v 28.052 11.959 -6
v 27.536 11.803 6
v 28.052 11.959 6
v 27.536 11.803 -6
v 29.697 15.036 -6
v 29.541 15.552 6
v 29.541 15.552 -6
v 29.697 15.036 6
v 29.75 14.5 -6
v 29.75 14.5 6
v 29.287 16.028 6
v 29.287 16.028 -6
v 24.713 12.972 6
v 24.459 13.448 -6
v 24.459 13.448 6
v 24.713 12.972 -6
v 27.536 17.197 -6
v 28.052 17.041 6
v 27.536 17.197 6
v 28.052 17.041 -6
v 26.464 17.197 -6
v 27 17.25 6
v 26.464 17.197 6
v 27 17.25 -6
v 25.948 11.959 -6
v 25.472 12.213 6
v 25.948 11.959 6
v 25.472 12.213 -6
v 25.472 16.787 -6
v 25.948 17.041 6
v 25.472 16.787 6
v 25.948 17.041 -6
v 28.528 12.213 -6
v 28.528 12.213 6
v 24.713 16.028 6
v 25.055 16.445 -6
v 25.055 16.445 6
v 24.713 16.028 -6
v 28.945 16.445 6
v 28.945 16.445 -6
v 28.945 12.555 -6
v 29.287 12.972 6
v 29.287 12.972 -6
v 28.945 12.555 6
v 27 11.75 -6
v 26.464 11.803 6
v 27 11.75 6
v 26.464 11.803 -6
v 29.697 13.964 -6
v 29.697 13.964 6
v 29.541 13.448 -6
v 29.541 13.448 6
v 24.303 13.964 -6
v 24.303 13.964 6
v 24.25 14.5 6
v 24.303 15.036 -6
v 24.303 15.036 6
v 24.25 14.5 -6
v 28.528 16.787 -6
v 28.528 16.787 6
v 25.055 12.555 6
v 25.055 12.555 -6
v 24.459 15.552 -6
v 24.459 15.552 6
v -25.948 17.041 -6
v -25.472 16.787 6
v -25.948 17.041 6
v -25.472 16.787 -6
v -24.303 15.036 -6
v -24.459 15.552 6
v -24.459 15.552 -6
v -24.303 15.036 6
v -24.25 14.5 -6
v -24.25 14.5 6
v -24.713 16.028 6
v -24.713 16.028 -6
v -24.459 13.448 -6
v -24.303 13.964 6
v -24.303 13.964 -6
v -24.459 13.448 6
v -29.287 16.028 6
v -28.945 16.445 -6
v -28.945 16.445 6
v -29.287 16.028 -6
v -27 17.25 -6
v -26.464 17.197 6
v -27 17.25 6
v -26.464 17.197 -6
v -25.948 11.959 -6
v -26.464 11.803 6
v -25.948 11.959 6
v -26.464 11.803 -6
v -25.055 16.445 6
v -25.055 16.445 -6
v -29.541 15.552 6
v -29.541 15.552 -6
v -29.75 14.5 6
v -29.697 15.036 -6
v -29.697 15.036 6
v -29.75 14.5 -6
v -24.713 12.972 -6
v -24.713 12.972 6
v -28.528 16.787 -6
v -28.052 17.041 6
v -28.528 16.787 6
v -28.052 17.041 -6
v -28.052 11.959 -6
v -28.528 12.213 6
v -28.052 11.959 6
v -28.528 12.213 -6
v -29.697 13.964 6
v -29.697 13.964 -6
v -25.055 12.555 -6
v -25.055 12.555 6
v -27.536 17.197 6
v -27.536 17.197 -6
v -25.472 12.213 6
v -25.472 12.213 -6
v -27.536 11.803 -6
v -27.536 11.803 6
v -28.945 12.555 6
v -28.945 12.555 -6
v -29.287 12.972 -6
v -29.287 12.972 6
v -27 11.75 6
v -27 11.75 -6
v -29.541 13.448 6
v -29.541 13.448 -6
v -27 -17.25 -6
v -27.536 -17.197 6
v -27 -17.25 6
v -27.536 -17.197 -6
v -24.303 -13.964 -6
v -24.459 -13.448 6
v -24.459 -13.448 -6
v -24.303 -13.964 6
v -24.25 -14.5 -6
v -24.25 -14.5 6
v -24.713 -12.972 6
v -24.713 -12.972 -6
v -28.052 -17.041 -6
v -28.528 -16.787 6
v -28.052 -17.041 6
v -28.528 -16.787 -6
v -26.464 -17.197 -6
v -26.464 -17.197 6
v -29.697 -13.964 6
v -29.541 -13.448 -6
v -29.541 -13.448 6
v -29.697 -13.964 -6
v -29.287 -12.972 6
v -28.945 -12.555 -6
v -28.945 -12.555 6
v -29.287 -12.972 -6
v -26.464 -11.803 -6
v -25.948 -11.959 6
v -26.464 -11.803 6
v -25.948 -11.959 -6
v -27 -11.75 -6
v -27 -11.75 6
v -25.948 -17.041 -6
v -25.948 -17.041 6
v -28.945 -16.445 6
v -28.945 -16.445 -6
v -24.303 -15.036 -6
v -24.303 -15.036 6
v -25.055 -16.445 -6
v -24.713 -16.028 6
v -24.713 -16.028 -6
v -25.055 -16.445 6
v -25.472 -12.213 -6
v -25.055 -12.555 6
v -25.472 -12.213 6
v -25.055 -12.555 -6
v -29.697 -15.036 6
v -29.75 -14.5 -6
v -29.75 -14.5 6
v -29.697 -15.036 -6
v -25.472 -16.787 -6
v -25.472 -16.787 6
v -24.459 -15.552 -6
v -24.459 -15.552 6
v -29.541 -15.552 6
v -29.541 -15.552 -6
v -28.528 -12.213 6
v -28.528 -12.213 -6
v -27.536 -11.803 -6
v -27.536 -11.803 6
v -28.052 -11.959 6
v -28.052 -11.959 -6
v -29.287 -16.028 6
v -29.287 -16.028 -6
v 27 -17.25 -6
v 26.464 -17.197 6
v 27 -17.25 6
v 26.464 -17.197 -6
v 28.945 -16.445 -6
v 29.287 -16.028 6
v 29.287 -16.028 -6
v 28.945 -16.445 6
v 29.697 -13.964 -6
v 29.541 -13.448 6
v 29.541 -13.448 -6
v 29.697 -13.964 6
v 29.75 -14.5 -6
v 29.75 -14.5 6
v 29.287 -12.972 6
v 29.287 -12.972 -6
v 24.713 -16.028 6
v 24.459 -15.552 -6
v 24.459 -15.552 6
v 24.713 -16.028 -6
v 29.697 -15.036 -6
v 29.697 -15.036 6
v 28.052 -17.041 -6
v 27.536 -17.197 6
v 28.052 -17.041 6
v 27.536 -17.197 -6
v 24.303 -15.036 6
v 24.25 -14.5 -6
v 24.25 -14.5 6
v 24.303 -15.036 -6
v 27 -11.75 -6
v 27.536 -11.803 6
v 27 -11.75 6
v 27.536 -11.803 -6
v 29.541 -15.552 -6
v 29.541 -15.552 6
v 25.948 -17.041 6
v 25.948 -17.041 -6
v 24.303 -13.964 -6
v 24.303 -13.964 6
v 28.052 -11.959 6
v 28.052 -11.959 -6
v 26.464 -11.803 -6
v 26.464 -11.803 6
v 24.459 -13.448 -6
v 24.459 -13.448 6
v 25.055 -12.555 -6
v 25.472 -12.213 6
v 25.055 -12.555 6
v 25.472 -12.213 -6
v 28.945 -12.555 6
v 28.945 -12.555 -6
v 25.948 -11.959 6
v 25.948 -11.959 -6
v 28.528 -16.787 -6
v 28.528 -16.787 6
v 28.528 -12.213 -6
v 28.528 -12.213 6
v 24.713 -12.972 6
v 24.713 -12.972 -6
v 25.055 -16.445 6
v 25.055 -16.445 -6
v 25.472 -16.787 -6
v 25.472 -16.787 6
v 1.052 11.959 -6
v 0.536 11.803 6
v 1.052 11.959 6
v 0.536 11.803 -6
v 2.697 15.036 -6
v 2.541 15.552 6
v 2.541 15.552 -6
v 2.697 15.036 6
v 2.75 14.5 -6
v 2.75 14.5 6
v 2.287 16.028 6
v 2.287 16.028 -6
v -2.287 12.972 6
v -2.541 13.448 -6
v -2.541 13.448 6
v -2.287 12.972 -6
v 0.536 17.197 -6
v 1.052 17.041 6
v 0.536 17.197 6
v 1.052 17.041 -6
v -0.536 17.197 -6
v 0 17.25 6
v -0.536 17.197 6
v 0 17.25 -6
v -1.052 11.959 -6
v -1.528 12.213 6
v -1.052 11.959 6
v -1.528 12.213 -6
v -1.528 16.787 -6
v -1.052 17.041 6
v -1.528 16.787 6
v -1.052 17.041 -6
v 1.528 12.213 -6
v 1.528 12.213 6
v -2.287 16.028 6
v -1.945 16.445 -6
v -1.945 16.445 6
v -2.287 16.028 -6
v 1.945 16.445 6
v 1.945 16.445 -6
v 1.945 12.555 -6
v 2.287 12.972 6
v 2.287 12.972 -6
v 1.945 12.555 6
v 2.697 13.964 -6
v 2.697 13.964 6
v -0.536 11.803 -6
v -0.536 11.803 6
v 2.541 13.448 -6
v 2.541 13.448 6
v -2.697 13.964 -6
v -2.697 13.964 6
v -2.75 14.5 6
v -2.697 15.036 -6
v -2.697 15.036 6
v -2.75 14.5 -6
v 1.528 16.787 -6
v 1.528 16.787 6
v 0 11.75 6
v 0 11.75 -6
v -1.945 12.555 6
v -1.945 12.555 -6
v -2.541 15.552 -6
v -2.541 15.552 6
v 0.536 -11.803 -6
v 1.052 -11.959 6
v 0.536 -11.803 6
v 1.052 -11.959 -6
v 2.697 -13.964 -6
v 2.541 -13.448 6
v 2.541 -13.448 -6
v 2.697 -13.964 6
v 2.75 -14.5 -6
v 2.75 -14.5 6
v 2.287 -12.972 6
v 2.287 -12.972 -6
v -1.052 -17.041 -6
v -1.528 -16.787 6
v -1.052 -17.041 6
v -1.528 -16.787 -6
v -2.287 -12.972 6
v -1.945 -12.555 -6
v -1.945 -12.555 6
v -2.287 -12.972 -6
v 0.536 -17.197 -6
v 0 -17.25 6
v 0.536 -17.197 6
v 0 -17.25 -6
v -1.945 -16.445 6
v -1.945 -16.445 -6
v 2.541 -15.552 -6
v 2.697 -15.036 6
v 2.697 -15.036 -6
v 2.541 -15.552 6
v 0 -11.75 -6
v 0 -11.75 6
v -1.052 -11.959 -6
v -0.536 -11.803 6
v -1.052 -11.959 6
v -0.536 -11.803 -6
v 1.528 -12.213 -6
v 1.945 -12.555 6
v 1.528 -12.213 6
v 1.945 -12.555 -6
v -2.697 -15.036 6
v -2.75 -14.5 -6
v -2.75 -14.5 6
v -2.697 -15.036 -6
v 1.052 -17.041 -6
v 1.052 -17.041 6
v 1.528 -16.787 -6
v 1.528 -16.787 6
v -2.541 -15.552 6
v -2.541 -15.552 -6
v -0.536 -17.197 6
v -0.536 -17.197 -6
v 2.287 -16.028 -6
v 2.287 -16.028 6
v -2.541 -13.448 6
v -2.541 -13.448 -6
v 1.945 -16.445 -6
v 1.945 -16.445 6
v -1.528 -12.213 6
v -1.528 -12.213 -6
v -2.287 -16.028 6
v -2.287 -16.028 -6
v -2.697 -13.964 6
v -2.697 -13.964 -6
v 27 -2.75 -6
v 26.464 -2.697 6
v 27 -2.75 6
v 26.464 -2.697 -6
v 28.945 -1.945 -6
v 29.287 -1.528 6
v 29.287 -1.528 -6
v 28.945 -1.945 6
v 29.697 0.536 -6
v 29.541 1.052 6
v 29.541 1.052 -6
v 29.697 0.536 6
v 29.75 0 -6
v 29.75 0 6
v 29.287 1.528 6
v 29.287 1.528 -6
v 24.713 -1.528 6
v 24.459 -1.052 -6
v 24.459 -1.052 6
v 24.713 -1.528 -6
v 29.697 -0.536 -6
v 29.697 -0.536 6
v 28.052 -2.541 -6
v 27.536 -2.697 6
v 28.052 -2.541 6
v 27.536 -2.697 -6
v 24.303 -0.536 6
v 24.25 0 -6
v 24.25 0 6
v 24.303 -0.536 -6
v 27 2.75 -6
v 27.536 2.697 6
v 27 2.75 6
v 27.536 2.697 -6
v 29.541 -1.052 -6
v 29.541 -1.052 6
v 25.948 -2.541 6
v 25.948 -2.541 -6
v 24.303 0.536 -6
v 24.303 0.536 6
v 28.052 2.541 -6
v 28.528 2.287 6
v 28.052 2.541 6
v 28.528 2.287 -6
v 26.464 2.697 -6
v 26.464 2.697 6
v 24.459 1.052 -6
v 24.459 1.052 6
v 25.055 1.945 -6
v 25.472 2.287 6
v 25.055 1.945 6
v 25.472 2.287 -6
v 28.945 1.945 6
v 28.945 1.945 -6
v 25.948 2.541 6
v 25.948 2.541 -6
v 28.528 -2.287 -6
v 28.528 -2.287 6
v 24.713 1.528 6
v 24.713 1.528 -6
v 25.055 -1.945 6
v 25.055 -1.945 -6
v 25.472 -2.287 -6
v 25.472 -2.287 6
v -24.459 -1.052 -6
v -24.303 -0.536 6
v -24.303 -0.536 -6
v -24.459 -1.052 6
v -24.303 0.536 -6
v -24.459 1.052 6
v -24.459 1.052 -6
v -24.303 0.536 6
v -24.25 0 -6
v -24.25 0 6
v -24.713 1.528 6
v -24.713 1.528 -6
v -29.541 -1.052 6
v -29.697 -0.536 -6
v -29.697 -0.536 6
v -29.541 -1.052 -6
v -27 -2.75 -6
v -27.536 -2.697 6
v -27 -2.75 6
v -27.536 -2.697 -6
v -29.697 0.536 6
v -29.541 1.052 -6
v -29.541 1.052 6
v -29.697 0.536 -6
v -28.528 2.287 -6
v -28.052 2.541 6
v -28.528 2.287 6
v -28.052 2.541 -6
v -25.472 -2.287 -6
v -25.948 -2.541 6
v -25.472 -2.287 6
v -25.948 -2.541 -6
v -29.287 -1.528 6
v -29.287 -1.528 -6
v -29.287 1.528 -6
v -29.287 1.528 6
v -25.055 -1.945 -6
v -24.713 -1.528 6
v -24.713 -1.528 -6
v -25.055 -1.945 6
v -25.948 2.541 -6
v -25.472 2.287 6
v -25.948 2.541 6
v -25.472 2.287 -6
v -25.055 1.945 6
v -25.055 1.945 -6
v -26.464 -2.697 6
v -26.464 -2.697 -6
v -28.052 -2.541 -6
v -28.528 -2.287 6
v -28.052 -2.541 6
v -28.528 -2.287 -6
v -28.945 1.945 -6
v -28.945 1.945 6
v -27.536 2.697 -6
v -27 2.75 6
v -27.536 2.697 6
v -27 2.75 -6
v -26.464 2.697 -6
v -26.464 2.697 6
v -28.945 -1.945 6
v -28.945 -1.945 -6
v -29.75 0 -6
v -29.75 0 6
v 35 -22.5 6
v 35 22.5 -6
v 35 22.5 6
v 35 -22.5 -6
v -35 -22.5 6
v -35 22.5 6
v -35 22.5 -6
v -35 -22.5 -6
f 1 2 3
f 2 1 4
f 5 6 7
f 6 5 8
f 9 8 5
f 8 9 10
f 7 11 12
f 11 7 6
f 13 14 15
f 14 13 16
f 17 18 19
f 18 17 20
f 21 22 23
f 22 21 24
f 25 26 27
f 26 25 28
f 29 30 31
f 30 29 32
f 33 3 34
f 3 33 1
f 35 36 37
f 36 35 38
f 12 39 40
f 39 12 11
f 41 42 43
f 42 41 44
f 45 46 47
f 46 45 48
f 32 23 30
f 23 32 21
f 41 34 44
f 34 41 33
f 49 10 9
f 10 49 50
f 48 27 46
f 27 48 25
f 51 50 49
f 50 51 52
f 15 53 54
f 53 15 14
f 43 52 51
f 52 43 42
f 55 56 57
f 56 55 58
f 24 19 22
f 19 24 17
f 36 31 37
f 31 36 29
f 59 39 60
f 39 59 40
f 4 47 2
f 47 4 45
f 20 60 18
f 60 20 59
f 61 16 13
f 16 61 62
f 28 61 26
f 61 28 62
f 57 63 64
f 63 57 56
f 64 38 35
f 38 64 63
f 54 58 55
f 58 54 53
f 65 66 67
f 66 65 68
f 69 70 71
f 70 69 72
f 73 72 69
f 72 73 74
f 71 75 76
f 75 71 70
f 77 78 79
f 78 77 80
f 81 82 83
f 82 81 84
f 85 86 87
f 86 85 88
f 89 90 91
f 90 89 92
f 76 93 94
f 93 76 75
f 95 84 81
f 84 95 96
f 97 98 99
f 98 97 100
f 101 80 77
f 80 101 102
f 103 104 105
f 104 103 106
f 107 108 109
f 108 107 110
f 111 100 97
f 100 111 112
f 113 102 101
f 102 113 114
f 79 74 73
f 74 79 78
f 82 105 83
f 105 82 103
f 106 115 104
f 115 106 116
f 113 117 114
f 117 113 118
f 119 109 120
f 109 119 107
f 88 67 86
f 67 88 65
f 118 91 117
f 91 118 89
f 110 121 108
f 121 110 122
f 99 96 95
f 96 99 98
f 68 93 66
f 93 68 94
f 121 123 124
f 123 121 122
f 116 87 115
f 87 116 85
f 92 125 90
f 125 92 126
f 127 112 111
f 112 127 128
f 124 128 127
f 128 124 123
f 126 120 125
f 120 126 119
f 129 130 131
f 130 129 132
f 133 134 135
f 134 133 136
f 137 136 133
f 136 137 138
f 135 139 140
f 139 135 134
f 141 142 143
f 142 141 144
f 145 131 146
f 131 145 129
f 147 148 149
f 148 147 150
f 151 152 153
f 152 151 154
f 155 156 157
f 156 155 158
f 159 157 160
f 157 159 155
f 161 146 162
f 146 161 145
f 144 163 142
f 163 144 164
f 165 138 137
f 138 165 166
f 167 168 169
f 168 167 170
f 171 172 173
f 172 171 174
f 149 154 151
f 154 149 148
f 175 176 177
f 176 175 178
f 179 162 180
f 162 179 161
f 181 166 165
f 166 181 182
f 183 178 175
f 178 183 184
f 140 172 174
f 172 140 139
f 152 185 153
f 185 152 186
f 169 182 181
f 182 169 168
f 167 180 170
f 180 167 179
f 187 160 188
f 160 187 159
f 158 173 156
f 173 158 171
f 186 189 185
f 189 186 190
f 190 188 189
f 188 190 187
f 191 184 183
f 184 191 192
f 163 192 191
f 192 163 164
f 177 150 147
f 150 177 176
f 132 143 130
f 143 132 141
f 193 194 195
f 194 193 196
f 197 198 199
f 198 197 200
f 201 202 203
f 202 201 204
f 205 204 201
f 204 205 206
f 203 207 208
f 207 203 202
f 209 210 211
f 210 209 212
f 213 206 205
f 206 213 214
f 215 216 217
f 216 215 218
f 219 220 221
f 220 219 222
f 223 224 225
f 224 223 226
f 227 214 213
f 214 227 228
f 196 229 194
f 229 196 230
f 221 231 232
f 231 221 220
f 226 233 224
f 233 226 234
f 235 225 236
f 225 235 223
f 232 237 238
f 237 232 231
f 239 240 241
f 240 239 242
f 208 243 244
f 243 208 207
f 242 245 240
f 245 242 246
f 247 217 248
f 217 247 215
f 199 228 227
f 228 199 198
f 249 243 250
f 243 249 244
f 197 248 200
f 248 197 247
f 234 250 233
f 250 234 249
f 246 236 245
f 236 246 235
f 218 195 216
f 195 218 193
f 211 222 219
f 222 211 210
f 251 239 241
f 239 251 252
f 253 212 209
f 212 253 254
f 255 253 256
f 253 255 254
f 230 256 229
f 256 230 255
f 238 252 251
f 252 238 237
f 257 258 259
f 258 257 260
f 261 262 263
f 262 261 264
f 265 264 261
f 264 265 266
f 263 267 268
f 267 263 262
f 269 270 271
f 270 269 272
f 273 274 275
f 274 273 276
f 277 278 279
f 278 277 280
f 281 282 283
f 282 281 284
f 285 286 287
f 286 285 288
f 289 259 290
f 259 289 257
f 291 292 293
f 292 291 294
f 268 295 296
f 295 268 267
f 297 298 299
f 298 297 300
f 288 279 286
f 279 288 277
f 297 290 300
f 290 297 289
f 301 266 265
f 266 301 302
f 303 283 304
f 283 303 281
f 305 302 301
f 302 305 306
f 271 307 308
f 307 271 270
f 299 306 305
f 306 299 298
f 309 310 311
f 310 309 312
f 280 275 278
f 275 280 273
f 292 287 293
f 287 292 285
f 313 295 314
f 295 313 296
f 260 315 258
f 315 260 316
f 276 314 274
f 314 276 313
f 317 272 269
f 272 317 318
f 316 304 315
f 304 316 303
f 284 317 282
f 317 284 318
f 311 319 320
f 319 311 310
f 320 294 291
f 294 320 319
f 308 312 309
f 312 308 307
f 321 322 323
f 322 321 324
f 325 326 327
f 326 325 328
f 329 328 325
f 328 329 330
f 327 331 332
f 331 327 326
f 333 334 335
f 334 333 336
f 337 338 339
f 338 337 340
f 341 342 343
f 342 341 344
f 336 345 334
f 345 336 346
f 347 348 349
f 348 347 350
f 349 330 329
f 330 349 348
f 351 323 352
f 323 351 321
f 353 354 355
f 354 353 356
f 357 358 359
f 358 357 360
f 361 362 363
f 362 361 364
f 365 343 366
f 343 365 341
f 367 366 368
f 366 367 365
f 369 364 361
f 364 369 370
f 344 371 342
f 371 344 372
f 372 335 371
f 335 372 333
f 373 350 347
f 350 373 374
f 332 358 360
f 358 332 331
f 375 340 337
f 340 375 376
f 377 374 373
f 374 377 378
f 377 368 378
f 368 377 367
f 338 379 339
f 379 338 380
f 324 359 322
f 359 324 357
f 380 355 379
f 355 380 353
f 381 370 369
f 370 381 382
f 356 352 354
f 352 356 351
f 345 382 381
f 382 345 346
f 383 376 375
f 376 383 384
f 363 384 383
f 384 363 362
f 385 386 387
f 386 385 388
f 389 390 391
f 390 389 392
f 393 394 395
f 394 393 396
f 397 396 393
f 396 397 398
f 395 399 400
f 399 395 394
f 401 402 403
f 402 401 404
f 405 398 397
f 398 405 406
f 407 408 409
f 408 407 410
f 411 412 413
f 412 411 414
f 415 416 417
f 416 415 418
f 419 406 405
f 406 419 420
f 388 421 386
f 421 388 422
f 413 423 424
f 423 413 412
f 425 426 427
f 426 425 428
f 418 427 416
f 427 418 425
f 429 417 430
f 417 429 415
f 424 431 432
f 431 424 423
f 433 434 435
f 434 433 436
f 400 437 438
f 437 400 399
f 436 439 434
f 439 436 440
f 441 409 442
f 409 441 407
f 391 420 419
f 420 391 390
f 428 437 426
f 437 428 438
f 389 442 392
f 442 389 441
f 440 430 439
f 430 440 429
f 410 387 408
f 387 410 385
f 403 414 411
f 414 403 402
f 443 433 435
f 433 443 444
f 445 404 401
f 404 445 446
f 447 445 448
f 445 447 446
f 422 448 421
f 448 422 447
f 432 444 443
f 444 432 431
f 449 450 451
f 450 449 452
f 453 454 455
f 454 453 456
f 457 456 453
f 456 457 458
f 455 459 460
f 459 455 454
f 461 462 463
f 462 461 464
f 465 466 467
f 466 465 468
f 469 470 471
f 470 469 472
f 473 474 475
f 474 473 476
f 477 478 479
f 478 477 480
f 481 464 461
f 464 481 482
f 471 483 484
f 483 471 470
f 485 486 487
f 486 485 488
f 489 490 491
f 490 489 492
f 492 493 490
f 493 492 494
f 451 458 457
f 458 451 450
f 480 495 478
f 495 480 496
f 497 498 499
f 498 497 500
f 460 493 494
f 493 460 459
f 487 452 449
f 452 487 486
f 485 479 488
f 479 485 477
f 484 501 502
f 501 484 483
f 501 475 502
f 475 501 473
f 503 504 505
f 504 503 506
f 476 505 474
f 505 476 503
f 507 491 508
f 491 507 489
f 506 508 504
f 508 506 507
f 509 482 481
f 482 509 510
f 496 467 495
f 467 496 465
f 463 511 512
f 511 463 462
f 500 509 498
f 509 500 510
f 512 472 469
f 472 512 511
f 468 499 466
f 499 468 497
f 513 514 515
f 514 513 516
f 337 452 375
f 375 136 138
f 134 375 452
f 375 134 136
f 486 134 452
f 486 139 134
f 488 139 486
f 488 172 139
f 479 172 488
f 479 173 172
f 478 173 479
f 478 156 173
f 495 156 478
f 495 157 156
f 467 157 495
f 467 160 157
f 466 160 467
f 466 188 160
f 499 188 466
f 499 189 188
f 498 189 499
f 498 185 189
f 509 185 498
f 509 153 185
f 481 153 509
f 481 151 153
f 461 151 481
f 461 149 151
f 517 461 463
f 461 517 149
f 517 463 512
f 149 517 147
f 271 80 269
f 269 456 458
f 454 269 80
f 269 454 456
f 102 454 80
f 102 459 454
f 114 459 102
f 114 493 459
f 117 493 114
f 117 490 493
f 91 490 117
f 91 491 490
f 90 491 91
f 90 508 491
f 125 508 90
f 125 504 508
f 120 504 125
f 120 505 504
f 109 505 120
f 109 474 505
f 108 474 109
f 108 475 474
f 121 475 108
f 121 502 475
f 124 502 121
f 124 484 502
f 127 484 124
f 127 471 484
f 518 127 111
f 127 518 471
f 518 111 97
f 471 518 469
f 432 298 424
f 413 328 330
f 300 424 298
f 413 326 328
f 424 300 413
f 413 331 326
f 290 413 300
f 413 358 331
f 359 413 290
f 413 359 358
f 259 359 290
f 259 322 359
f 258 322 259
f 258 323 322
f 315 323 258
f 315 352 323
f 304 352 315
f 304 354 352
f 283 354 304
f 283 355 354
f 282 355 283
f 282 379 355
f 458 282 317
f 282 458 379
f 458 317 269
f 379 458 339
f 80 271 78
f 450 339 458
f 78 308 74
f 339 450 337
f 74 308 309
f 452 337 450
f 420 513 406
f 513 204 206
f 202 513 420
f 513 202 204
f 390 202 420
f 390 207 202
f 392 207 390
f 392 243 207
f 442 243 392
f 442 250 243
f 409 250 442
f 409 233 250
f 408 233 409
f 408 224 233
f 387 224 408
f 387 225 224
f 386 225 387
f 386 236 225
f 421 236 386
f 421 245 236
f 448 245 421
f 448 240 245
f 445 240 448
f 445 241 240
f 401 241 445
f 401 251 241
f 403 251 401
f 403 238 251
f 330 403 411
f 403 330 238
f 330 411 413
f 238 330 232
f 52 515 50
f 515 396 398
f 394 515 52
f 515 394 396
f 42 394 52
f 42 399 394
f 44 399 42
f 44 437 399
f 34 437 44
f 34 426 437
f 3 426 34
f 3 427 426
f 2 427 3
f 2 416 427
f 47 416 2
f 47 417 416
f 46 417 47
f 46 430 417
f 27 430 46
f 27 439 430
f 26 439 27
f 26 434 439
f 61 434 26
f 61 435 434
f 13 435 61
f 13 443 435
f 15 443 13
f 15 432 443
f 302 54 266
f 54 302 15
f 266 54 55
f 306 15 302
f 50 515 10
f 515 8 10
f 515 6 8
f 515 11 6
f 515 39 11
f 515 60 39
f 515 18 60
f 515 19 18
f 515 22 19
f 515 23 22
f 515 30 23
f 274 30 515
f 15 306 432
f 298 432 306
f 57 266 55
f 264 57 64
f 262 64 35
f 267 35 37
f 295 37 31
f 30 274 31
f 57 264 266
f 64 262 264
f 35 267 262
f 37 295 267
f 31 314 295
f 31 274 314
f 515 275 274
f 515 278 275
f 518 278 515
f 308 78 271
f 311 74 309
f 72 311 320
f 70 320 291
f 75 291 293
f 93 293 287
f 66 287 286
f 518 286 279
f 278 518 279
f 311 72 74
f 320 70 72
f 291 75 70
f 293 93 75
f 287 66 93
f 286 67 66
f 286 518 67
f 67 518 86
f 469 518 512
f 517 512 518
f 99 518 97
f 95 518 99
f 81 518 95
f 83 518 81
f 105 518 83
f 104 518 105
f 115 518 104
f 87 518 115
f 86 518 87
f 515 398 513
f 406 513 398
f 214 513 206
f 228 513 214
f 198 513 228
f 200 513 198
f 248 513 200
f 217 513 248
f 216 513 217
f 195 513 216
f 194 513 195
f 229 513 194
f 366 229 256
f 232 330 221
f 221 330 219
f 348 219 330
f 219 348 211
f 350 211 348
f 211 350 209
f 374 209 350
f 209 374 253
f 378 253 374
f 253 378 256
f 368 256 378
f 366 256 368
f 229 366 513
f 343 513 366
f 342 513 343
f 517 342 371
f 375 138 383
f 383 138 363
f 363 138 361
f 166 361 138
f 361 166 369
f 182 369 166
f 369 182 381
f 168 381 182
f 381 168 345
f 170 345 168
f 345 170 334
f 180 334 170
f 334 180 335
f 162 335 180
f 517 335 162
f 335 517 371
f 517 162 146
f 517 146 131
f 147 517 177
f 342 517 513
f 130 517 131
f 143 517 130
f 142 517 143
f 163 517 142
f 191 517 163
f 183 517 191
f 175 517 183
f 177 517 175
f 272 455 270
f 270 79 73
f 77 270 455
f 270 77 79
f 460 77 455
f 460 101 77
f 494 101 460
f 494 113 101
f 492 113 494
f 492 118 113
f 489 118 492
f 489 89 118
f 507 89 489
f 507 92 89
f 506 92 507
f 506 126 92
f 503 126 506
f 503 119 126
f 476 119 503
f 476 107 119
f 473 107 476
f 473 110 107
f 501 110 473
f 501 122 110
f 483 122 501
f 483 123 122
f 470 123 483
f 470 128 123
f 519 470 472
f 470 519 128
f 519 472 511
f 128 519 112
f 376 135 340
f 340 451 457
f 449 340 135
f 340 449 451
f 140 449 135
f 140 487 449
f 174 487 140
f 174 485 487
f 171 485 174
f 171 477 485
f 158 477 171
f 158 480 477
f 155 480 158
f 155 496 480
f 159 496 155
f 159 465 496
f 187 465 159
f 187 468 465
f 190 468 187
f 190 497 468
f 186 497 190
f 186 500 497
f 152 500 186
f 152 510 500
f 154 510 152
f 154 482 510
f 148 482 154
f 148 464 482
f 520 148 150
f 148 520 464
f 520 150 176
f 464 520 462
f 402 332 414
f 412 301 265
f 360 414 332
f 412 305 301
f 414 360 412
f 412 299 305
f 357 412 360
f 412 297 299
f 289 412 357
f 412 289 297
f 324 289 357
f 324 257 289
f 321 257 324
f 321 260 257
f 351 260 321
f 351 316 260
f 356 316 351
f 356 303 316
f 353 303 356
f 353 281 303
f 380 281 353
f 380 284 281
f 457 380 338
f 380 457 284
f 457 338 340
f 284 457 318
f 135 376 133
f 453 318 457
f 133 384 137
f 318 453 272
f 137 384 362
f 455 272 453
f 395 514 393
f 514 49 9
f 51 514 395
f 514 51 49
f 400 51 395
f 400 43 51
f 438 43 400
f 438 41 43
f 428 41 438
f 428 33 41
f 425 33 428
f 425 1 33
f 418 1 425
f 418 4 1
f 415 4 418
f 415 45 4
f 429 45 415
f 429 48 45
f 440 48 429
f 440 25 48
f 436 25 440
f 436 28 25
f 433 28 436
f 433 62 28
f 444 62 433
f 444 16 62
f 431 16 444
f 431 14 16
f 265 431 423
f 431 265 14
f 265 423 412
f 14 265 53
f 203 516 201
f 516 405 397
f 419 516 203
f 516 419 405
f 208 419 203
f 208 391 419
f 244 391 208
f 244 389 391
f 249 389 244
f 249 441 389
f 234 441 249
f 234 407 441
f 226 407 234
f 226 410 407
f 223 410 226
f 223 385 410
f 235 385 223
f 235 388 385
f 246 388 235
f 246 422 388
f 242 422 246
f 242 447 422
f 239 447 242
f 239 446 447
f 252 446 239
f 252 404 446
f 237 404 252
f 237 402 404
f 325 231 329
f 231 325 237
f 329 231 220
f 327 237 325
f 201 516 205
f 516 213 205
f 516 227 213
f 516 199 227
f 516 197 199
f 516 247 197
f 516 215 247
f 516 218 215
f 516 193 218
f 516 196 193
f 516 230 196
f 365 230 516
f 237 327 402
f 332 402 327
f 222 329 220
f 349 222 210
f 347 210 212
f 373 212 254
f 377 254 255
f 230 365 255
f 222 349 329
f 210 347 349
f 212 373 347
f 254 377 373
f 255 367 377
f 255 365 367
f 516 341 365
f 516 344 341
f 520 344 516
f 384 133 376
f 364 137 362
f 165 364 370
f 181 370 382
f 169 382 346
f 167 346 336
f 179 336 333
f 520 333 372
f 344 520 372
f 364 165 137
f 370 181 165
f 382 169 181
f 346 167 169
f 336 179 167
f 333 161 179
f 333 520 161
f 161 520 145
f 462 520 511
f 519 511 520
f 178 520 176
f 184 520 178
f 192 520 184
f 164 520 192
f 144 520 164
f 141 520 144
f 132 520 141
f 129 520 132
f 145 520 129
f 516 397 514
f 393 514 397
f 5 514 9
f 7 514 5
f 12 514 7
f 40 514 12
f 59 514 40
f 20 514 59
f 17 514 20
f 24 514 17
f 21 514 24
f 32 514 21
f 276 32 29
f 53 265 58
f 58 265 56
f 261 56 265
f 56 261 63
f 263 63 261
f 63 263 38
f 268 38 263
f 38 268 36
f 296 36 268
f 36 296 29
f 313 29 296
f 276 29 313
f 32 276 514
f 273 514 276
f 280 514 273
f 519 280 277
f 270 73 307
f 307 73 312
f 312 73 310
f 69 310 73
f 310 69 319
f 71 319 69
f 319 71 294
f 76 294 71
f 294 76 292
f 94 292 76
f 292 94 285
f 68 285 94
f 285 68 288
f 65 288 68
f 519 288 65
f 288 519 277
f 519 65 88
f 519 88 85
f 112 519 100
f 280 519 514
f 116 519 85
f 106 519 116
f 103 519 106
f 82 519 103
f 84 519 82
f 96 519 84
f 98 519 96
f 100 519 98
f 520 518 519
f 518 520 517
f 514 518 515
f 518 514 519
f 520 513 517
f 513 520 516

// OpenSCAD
$fn = 32;

// ----------------------------------------------------------------------
// Corner plate 70 x 45 x 12
// 8 holes, centres taken from the edge offset
// ----------------------------------------------------------------------

// --- parameters (mm) ---
plate = [70, 45, 12];  // overall size (x, y, z)
holes = 8;             // number of holes the drawing asks for
hole_d = 5.5;          // hole diameter
edge = 8;              // hole centre offset from the plate edge

// --- derived feature positions (mm) ---
corner_x = plate[0] / 2 - edge;  // = 27   corner hole X
corner_y = plate[1] / 2 - edge;  // = 14.5   corner hole Y
feature_centers = [
  [corner_x, corner_y],
  [-corner_x, corner_y],
  [-corner_x, -corner_y],
  [corner_x, -corner_y],
  [0, corner_y],
  [0, -corner_y],
  [corner_x, 0],
  [-corner_x, 0]
];   // hole centres the loop below drills

// plate outline, every hole drilled through with the same cutters
difference() {
  cube(plate, center = true);
  for (centre = feature_centers)
    translate([centre[0], centre[1], 0])
      cylinder(d = hole_d, h = plate[2] + 2, center = true);
}
